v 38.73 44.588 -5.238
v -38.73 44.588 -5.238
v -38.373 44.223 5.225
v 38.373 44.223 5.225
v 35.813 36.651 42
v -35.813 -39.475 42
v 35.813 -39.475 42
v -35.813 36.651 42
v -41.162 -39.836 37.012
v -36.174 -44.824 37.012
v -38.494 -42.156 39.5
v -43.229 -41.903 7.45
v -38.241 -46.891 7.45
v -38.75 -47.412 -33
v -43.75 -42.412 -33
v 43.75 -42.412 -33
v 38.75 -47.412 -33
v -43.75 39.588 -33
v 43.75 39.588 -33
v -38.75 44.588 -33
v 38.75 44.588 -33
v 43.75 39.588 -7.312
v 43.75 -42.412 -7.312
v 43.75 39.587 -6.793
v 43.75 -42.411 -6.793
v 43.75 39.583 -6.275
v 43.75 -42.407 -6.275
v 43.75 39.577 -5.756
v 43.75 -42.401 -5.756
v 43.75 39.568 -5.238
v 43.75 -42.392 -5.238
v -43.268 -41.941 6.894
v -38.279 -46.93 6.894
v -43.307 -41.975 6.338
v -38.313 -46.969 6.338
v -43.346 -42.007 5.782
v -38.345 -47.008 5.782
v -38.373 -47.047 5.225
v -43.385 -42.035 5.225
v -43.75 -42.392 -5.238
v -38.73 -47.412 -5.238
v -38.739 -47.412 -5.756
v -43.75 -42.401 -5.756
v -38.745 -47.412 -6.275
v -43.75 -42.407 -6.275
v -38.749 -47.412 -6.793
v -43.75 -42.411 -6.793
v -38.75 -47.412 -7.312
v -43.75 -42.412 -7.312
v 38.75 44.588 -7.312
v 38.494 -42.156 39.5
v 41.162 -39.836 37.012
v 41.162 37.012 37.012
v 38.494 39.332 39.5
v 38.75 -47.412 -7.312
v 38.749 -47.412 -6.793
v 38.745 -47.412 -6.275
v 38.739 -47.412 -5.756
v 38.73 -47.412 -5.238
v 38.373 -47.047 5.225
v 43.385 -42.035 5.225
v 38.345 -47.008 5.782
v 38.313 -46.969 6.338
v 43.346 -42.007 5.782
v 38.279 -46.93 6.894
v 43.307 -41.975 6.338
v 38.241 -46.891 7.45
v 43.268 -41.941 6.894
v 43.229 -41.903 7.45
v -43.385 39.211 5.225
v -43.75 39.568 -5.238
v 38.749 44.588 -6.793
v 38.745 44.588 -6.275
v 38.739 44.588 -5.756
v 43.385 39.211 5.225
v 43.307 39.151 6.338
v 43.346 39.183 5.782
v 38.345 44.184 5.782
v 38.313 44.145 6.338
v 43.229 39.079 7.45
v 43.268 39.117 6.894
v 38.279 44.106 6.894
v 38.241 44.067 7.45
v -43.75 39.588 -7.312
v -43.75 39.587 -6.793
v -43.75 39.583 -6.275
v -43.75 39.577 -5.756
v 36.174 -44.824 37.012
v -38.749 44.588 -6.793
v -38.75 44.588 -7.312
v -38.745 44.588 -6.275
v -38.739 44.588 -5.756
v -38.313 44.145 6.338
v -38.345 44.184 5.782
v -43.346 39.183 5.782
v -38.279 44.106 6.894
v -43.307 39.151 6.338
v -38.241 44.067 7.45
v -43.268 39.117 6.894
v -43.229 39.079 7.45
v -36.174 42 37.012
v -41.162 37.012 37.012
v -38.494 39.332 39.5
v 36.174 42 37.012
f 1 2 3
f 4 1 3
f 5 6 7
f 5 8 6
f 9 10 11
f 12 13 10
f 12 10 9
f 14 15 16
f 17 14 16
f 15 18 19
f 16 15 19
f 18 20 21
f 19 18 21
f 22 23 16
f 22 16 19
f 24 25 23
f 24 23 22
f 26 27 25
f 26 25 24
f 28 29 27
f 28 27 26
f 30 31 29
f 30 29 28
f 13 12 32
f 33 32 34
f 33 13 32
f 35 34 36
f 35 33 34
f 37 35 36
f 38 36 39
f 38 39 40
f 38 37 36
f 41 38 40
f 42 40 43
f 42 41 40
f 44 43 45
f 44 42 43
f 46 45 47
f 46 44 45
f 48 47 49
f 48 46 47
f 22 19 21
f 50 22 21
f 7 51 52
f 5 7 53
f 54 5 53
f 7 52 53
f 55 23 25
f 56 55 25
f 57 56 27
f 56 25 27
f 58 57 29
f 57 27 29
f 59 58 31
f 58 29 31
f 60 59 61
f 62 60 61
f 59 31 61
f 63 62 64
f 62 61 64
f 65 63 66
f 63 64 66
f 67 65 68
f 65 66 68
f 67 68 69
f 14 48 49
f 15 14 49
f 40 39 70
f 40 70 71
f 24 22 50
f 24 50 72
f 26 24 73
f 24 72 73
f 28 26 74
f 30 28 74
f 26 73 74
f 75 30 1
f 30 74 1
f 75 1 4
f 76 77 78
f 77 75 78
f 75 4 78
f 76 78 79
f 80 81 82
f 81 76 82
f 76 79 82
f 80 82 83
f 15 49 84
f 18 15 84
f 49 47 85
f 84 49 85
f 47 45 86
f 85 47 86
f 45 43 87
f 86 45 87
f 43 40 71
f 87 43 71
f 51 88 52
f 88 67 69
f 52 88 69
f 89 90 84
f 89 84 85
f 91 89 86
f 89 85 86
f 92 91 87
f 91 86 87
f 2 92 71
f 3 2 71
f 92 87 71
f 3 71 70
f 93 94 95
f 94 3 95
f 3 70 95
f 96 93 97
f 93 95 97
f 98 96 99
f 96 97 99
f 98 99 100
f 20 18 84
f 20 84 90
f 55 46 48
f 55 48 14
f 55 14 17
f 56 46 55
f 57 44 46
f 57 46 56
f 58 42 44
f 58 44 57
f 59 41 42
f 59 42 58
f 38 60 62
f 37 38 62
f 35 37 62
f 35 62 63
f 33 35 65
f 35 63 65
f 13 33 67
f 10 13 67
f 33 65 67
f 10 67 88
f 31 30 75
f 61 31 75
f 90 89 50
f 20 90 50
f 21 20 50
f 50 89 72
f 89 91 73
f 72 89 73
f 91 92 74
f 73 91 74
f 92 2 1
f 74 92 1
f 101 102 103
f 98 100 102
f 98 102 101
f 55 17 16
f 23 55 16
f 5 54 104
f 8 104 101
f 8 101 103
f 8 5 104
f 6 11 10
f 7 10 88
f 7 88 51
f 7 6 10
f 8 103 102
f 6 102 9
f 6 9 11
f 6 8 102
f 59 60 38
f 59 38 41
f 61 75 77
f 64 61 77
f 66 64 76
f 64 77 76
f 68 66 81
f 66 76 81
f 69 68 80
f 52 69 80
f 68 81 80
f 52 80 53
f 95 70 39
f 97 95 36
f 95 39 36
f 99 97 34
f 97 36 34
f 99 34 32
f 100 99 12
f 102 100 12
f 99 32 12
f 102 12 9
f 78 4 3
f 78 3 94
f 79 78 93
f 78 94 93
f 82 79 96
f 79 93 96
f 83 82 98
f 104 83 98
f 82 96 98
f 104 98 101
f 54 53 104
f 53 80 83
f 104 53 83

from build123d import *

# Parameters (mm, degrees)
F0_W          = 87.5
F0_H          = 92
F1_DEPTH      = 42
F1_TAPER      = 4
F1_DEPTH_BACK = 33
F5_SIZE       = 5
F6_T1_DEPTH   = 58.7168298797
F6_T3_DEPTH   = 62.7898982715
F6_T5_DEPTH   = 62.7898982715
F6_T7_DEPTH   = 62.7898982715
F6_T9_DEPTH   = 62.7898982715
F7_T1_DEPTH   = 103.6905771188
F7_T3_DEPTH   = 44.0479092504
F7_T5_DEPTH   = 44.0479092504
F7_T7_DEPTH   = 108.1905771188
F7_T9_DEPTH   = 44.0479092503
F7_T11_DEPTH  = 44.0479092503


# Not quite as in the source:
# - a fillet or chamfer that OpenCascade refuses, or shapes differently, is made with other operations: its cross-section is extruded or revolved along the edge and cut away or added


with BuildPart() as f1:
    # F0 (on Top) → F1 (new body, two sides)
    with BuildSketch(Plane.XY) as f1_sk:
        with Locations((0, -1.4119595289)):
            Rectangle(F0_W, F0_H)
    extrude(amount=F1_DEPTH, taper=F1_TAPER)
    extrude(f1_sk.sketch, amount=-F1_DEPTH_BACK)

    # F5
    f5_edges = [f1.edges().sort_by_distance(p)[0] for p in [
        (0, -44.475033, 42),
        (40.813074, -1.41196, 42),
        (0, 41.651114, 42),
        (-40.813074, -1.41196, 42),
    ]]
    chamfer(f5_edges, length=F5_SIZE)

    # F6: chamfer of 5 on 8 edges, made by hand

    # F6_s2 → F6_t1 (cut)
    with BuildSketch(Plane.XY.offset(-45.8584149398)):
        Polygon((43.75, 39.5880404711), (38.75, 44.5880404711), (43.75, 44.5880404711), align=None)
        Polygon((-43.75, 39.5880404711), (-38.75, 44.5880404711), (-43.75, 44.5880404711), align=None)
        Polygon((-38.75, -47.4119595289), (-43.75, -42.4119595289), (-43.75, -47.4119595289), align=None)
        Polygon((38.75, -47.4119595289), (43.75, -42.4119595289), (43.75, -47.4119595289), align=None)
    extrude(amount=F6_T1_DEPTH, mode=Mode.SUBTRACT)

    # F6_s4 → F6_t3 (cut)
    with BuildSketch(Plane(origin=(-1.3320626645, -1.3320626645, -19.0493835976), x_dir=(-0.7071067812, 0.7071067812, 0), z_dir=(0.0695873743, 0.0695873743, 0.9951458158))):
        Polygon((-6.1163179384, 60.6385318402), (0.9375251077, 60.6385318402), (-2.5893964153, 64.1483330365), align=None)
    extrude(amount=F6_T3_DEPTH, mode=Mode.SUBTRACT)

    # F6_s6 → F6_t5 (cut)
    with BuildSketch(Plane(origin=(1.3320626645, -1.3320626645, -19.0493835976), x_dir=(-0.7071067812, -0.7071067812, 0), z_dir=(-0.0695873743, 0.0695873743, 0.9951458158))):
        Polygon((6.1163179384, 60.6385318402), (-0.9375251077, 60.6385318402), (2.5893964153, 64.1483330365), align=None)
    extrude(amount=F6_T5_DEPTH, mode=Mode.SUBTRACT)

    # F6_s8 → F6_t7 (cut)
    with BuildSketch(Plane(origin=(-1.3183881113, 1.3183881113, -18.8538283766), x_dir=(0.7071067812, 0.7071067812, 0), z_dir=(0.0695873743, -0.0695873743, 0.9951458158))):
        Polygon((-2.934337423, 58.6514124197), (4.119505623, 58.6514124197), (0.5925841, 62.161213616), align=None)
    extrude(amount=F6_T7_DEPTH, mode=Mode.SUBTRACT)

    # F6_s10 → F6_t9 (cut)
    with BuildSketch(Plane(origin=(1.3183881113, 1.3183881113, -18.8538283766), x_dir=(0.7071067812, -0.7071067812, 0), z_dir=(-0.0695873743, -0.0695873743, 0.9951458158))):
        Polygon((2.934337423, 58.6514124197), (-4.119505623, 58.6514124197), (-0.5925841, 62.161213616), align=None)
    extrude(amount=F6_T9_DEPTH, mode=Mode.SUBTRACT)

    # F7: fillet of radius 150 on 8 edges, made by hand

    # F7_s2 → F7_t1 (cut)
    with BuildSketch(Plane.YZ.offset(-51.8452885594)):
        with BuildLine():
            ThreePointArc((-47.0465670679, 5.2253556379), (-47.3205835818, -0.0031909184), (-47.4119595289, -5.2381154238))
            Line((-47.4119595289, -5.2381154238), (-47.4119595289, 0))
            Line((-47.4119595289, 0), (-47.0465670679, 5.2253556379))
        make_face()
        with BuildLine():
            ThreePointArc((44.5880404711, -5.2381154238), (44.4966645239, -0.0031909184), (44.2226480101, 5.2253556379))
            Line((44.2226480101, 5.2253556379), (44.5880404711, 0))
            Line((44.5880404711, 0), (44.5880404711, -5.2381154238))
        make_face()
    extrude(amount=F7_T1_DEPTH, mode=Mode.SUBTRACT)

    # F7_s4 → F7_t3 (cut)
    with BuildSketch(Plane(origin=(13.7423078996, 13.7423078996, 0), x_dir=(0, 0, 1), z_dir=(-0.7071067812, -0.7071067812, 0))):
        with BuildLine():
            ThreePointArc((-7.3117239806, -60.9257058632), (0.078105005, -60.7435633688), (7.4499872987, -60.1975782307))
            Line((7.4499872987, -60.1975782307), (0.0870892603, -60.9257058632))
            Line((0.0870892603, -60.9257058632), (-7.3117239806, -60.9257058632))
        make_face()
    extrude(amount=F7_T3_DEPTH, mode=Mode.SUBTRACT)

    # F7_s6 → F7_t5 (cut)
    with BuildSketch(Plane(origin=(17.4042674285, -17.4042674285, 0), x_dir=(0, 0, 1), z_dir=(-0.7071067812, 0.7071067812, 0))):
        with BuildLine():
            ThreePointArc((7.4499872987, -60.1975782307), (0.078105005, -60.7435633688), (-7.3117239806, -60.9257058632))
            Line((-7.3117239806, -60.9257058632), (0.0870892603, -60.9257058632))
            Line((0.0870892603, -60.9257058632), (7.4499872987, -60.1975782307))
        make_face()
    extrude(amount=F7_T5_DEPTH, mode=Mode.SUBTRACT)

    # F7_s8 → F7_t7 (cut)
    with BuildSketch(Plane.XZ.offset(-52.6833290305)):
        with BuildLine():
            ThreePointArc((43.75, -5.2381154238), (43.6586240529, -0.0031909184), (43.384607539, 5.2253556379))
            Line((43.384607539, 5.2253556379), (43.75, 0))
            Line((43.75, 0), (43.75, -5.2381154238))
        make_face()
        with BuildLine():
            ThreePointArc((-43.384607539, 5.2253556379), (-43.6586240529, -0.0031909184), (-43.75, -5.2381154238))
            Line((-43.75, -5.2381154238), (-43.75, 0))
            Line((-43.75, 0), (-43.384607539, 5.2253556379))
        make_face()
    extrude(amount=F7_T7_DEPTH, mode=Mode.SUBTRACT)

    # F7_s10 → F7_t9 (cut)
    with BuildSketch(Plane(origin=(-15.1542674285, -15.1542674285, 0), x_dir=(0, 0, 1), z_dir=(0.7071067812, 0.7071067812, 0))):
        with BuildLine():
            ThreePointArc((-7.3117239809, -58.9288935479), (0.0781050046, -58.7467510535), (7.4499872984, -58.2007659154))
            Line((7.4499872984, -58.2007659154), (0.08708926, -58.9288935479))
            Line((0.08708926, -58.9288935479), (-7.3117239809, -58.9288935479))
        make_face()
    extrude(amount=F7_T9_DEPTH, mode=Mode.SUBTRACT)

    # F7_s12 → F7_t11 (cut)
    with BuildSketch(Plane(origin=(-15.9923078995, 15.9923078995, 0), x_dir=(0, 0, 1), z_dir=(0.7071067812, -0.7071067812, 0))):
        with BuildLine():
            ThreePointArc((-7.3117239809, -58.9288935479), (0.0781050046, -58.7467510535), (7.4499872984, -58.2007659154))
            Line((7.4499872984, -58.2007659154), (0.08708926, -58.9288935479))
            Line((0.08708926, -58.9288935479), (-7.3117239809, -58.9288935479))
        make_face()
    extrude(amount=F7_T11_DEPTH, mode=Mode.SUBTRACT)


solid = f1.part
